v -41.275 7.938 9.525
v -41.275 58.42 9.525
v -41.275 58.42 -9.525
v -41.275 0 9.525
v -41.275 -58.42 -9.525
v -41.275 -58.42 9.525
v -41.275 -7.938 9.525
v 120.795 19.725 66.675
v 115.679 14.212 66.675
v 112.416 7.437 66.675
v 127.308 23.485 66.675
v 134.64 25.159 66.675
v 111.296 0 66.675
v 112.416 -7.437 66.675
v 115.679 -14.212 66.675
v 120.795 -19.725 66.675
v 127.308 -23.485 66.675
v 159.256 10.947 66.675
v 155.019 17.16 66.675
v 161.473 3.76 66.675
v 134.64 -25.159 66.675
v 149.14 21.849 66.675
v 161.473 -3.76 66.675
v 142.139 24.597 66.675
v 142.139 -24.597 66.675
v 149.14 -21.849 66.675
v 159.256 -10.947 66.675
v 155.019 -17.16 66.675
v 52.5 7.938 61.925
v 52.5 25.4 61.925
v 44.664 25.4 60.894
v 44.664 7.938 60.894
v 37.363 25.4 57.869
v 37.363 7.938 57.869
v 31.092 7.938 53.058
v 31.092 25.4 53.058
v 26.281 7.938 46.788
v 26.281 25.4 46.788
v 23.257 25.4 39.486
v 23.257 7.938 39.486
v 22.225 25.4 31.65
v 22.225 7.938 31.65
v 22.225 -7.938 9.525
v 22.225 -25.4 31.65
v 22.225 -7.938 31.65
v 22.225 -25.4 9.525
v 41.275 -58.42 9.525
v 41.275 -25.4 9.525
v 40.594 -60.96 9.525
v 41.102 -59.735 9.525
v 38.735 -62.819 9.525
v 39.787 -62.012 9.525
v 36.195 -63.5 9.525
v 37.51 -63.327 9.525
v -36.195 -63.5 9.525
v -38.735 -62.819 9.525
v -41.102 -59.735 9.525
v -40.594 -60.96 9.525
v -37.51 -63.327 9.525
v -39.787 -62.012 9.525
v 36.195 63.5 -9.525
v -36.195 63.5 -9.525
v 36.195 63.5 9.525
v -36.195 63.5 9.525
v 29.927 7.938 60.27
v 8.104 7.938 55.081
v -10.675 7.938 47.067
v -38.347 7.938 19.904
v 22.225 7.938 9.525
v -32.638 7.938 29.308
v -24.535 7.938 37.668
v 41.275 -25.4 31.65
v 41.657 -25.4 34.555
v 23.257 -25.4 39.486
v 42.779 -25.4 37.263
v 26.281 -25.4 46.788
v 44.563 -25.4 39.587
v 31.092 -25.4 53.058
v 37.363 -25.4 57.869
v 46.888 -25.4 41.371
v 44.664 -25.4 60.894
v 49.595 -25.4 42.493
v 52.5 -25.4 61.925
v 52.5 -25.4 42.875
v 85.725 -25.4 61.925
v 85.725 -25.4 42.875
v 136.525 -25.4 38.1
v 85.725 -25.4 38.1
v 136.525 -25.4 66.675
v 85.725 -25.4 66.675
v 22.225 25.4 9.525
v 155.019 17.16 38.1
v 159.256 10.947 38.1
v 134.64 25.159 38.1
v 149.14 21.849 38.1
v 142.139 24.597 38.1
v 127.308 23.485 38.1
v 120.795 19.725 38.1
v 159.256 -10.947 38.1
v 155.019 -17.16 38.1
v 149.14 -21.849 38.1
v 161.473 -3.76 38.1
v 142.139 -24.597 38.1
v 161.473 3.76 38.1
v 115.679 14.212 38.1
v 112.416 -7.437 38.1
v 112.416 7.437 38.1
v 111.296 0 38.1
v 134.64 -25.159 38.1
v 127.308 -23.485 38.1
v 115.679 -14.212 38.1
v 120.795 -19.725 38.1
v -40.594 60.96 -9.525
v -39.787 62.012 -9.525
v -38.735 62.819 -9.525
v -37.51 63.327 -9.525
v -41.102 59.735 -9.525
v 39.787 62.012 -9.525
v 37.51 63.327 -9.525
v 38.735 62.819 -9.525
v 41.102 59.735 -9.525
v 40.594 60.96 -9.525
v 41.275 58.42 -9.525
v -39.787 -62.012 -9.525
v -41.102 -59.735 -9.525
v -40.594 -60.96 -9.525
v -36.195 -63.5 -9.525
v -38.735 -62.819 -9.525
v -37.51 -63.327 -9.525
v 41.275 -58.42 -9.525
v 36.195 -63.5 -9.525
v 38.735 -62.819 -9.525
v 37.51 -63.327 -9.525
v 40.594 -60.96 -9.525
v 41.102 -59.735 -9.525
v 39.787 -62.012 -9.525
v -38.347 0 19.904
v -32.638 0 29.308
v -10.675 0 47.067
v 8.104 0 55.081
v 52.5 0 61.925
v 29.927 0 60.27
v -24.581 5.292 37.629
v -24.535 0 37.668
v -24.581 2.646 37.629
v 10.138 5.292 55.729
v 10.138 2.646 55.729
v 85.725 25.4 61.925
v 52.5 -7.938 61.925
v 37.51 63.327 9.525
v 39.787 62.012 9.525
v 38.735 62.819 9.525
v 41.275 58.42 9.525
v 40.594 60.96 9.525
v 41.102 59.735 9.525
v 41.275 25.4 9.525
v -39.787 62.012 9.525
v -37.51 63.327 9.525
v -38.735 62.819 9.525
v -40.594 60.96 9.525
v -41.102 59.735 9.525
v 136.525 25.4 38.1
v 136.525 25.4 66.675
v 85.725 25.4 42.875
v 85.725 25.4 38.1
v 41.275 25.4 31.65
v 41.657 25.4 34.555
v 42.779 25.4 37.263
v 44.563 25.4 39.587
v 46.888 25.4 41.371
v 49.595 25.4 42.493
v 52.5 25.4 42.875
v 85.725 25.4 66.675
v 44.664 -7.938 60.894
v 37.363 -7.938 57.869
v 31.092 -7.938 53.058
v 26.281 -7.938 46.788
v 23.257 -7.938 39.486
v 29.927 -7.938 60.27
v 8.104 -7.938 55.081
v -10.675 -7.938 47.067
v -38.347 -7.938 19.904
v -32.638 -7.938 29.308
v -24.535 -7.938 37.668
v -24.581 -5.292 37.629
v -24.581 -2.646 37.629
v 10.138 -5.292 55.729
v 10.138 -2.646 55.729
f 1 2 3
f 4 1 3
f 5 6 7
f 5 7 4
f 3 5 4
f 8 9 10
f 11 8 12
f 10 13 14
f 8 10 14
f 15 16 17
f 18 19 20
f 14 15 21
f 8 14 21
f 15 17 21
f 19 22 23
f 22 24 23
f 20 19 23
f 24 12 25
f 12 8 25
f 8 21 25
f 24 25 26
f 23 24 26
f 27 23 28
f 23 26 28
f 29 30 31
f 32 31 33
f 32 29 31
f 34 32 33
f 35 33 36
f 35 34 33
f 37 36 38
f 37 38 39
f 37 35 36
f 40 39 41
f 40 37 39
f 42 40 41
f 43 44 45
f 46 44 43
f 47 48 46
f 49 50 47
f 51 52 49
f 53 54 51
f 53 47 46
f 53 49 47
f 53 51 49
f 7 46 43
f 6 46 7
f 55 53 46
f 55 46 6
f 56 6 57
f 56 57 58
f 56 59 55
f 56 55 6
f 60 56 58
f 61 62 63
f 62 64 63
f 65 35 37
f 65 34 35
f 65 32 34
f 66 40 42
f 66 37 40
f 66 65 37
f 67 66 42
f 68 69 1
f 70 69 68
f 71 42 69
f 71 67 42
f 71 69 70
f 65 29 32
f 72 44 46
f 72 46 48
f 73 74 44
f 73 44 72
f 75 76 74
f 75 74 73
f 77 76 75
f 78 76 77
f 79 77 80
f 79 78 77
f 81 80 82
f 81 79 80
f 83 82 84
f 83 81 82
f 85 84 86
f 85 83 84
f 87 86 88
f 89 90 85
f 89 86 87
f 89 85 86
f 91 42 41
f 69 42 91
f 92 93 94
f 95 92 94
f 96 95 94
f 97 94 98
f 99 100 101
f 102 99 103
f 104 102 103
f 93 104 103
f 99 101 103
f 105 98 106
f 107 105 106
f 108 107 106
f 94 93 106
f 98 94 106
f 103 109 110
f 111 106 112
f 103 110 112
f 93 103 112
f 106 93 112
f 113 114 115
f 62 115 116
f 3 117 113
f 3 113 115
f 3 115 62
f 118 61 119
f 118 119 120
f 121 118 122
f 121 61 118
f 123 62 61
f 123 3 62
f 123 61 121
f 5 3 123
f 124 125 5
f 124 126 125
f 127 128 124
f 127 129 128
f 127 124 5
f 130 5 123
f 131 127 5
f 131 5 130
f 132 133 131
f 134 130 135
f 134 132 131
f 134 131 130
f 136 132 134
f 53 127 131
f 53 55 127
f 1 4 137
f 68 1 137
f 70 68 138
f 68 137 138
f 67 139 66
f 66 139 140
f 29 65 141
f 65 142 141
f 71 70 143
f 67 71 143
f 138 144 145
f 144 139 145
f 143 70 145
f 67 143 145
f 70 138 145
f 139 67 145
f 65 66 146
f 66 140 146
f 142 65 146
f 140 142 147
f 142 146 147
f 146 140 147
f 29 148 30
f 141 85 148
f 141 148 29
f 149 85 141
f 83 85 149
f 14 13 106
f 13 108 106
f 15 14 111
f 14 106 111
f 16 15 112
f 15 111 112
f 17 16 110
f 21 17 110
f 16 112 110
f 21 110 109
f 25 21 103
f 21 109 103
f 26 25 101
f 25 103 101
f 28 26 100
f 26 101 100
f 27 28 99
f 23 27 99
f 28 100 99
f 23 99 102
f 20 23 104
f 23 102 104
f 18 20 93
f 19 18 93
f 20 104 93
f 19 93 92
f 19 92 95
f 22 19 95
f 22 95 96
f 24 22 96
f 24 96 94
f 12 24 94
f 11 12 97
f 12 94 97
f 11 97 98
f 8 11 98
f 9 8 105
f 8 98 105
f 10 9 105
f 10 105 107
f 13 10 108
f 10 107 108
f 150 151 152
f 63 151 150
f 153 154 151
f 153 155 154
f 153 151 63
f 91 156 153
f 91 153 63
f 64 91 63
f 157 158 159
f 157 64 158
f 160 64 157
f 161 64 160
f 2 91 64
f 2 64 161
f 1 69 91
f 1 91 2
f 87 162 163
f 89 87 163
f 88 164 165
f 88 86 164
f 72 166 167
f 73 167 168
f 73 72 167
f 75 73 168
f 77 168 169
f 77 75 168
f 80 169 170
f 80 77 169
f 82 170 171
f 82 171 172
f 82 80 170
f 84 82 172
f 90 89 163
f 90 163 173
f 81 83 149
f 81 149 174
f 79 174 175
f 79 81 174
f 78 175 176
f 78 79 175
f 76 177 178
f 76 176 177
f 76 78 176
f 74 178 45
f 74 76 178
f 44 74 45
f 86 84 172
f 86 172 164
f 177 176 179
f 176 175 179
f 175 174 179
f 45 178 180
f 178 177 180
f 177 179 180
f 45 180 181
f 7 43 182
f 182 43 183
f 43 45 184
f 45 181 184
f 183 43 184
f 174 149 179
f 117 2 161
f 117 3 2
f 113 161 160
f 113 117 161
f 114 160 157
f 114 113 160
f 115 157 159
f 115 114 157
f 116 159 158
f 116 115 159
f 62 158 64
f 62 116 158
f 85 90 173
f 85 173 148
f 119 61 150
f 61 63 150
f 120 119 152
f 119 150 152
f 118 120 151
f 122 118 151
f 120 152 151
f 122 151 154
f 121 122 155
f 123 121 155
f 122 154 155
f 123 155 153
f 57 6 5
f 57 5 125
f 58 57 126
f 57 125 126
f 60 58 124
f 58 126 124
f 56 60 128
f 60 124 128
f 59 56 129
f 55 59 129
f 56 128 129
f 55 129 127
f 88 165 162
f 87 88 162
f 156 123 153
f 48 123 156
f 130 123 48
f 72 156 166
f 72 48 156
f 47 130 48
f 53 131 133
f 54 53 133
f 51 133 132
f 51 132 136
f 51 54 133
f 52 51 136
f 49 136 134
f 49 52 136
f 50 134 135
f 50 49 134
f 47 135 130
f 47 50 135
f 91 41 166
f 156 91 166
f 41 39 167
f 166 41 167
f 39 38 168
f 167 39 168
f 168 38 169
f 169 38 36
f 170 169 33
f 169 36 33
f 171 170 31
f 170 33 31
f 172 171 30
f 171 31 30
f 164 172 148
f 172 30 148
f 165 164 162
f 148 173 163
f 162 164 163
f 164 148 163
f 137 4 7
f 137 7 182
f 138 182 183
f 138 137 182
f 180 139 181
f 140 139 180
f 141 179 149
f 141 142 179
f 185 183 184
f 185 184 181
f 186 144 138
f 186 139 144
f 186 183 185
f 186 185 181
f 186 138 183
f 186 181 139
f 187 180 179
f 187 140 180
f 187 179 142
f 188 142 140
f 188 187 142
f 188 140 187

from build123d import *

# Parameters (mm, degrees)
F1_DEPTH = 63.5
F0_W     = 25.5705659628
F0_H     = 4.7498
F0_H_2   = 19.05
F0_H_3   = 4.7752
F2_DEPTH = 25.4
F3_DEPTH = 7.9375
F5_R     = 5.08


with BuildPart() as f1:
    # F0 (on Front) → F1 (new body, symmetric)
    with BuildSketch(Plane.XZ):
        Polygon((22.225, 9.525), (-41.275, 9.525), (-41.275, -9.525), (41.275, -9.525), (41.275, 9.525), align=None)
    extrude(amount=F1_DEPTH, both=True)

    # F0 (on Front) → F2 (join, symmetric)
    with BuildSketch(Plane.XZ):
        Polygon((111.2955659628, 66.675), (111.2955659628, 61.9252), (111.2955659628, 42.8752), (111.2955659628, 38.1), (136.525, 38.1), (136.525, 66.675), align=None)
        with Locations((98.5102829814, 64.3001)):
            Rectangle(F0_W, F0_H)
        with Locations((98.5102829814, 52.4002)):
            Rectangle(F0_W, F0_H_2)
        with Locations((98.5102829814, 40.4876)):
            Rectangle(F0_W, F0_H_3)
        with BuildLine():
            Line((22.225, 31.6498798487), (22.225, 9.525))
            Line((22.225, 9.525), (41.275, 9.525))
            Line((41.275, 9.525), (41.275, 31.6498798487))
            ThreePointArc((41.275, 31.6498798487), (44.5628201513, 39.5873798487), (52.5003201513, 42.8752))
            Line((52.5003201513, 42.8752), (85.725, 42.8752))
            Line((85.725, 42.8752), (85.725, 61.9252))
            Line((85.725, 61.9252), (52.5003201513, 61.9252))
            ThreePointArc((52.5003201513, 61.9252), (31.0924359697, 53.0577640303), (22.225, 31.6498798487))
        make_face()
    extrude(amount=F2_DEPTH, both=True)

    # F0 (on Front) → F3 (join, symmetric)
    with BuildSketch(Plane.XZ):
        with BuildLine():
            add(Edge.make_bspline(
                [(-41.275, 9.525), (-37.0544083416, 41.9974066317), (9.7774779424, 62.3142682016), (52.5003201513, 61.9252)],
                knots=[0, 0, 0, 0, 107.4224912648, 107.4224912648, 107.4224912648, 107.4224912648], degree=3))
            Line((-41.275, 9.525), (22.225, 9.525))
            Line((22.225, 9.525), (22.225, 31.6498798487))
            ThreePointArc((22.225, 31.6498798487), (31.0924359697, 53.0577640303), (52.5003201513, 61.9252))
        make_face()
    extrude(amount=F3_DEPTH, both=True)

    # F5
    f5_edges = [f1.edges().sort_by_distance(p)[0] for p in [
        (41.275, -63.5, 0),
        (-41.275, -63.5, 0),
        (-41.275, 63.5, 0),
        (41.275, 63.5, 0),
    ]]
    fillet(f5_edges, radius=F5_R)


with BuildPart() as f4:
    # F0 (on Front) → F4 (revolve)
    with BuildSketch(Plane.XZ):
        Polygon((111.2955659628, 66.675), (111.2955659628, 61.9252), (111.2955659628, 42.8752), (111.2955659628, 38.1), (136.525, 38.1), (136.525, 66.675), align=None)
    revolve(axis=Axis((136.525, 0, 52.3875), (0, 0, 1)))


solid = Compound([f1.part, f4.part])
